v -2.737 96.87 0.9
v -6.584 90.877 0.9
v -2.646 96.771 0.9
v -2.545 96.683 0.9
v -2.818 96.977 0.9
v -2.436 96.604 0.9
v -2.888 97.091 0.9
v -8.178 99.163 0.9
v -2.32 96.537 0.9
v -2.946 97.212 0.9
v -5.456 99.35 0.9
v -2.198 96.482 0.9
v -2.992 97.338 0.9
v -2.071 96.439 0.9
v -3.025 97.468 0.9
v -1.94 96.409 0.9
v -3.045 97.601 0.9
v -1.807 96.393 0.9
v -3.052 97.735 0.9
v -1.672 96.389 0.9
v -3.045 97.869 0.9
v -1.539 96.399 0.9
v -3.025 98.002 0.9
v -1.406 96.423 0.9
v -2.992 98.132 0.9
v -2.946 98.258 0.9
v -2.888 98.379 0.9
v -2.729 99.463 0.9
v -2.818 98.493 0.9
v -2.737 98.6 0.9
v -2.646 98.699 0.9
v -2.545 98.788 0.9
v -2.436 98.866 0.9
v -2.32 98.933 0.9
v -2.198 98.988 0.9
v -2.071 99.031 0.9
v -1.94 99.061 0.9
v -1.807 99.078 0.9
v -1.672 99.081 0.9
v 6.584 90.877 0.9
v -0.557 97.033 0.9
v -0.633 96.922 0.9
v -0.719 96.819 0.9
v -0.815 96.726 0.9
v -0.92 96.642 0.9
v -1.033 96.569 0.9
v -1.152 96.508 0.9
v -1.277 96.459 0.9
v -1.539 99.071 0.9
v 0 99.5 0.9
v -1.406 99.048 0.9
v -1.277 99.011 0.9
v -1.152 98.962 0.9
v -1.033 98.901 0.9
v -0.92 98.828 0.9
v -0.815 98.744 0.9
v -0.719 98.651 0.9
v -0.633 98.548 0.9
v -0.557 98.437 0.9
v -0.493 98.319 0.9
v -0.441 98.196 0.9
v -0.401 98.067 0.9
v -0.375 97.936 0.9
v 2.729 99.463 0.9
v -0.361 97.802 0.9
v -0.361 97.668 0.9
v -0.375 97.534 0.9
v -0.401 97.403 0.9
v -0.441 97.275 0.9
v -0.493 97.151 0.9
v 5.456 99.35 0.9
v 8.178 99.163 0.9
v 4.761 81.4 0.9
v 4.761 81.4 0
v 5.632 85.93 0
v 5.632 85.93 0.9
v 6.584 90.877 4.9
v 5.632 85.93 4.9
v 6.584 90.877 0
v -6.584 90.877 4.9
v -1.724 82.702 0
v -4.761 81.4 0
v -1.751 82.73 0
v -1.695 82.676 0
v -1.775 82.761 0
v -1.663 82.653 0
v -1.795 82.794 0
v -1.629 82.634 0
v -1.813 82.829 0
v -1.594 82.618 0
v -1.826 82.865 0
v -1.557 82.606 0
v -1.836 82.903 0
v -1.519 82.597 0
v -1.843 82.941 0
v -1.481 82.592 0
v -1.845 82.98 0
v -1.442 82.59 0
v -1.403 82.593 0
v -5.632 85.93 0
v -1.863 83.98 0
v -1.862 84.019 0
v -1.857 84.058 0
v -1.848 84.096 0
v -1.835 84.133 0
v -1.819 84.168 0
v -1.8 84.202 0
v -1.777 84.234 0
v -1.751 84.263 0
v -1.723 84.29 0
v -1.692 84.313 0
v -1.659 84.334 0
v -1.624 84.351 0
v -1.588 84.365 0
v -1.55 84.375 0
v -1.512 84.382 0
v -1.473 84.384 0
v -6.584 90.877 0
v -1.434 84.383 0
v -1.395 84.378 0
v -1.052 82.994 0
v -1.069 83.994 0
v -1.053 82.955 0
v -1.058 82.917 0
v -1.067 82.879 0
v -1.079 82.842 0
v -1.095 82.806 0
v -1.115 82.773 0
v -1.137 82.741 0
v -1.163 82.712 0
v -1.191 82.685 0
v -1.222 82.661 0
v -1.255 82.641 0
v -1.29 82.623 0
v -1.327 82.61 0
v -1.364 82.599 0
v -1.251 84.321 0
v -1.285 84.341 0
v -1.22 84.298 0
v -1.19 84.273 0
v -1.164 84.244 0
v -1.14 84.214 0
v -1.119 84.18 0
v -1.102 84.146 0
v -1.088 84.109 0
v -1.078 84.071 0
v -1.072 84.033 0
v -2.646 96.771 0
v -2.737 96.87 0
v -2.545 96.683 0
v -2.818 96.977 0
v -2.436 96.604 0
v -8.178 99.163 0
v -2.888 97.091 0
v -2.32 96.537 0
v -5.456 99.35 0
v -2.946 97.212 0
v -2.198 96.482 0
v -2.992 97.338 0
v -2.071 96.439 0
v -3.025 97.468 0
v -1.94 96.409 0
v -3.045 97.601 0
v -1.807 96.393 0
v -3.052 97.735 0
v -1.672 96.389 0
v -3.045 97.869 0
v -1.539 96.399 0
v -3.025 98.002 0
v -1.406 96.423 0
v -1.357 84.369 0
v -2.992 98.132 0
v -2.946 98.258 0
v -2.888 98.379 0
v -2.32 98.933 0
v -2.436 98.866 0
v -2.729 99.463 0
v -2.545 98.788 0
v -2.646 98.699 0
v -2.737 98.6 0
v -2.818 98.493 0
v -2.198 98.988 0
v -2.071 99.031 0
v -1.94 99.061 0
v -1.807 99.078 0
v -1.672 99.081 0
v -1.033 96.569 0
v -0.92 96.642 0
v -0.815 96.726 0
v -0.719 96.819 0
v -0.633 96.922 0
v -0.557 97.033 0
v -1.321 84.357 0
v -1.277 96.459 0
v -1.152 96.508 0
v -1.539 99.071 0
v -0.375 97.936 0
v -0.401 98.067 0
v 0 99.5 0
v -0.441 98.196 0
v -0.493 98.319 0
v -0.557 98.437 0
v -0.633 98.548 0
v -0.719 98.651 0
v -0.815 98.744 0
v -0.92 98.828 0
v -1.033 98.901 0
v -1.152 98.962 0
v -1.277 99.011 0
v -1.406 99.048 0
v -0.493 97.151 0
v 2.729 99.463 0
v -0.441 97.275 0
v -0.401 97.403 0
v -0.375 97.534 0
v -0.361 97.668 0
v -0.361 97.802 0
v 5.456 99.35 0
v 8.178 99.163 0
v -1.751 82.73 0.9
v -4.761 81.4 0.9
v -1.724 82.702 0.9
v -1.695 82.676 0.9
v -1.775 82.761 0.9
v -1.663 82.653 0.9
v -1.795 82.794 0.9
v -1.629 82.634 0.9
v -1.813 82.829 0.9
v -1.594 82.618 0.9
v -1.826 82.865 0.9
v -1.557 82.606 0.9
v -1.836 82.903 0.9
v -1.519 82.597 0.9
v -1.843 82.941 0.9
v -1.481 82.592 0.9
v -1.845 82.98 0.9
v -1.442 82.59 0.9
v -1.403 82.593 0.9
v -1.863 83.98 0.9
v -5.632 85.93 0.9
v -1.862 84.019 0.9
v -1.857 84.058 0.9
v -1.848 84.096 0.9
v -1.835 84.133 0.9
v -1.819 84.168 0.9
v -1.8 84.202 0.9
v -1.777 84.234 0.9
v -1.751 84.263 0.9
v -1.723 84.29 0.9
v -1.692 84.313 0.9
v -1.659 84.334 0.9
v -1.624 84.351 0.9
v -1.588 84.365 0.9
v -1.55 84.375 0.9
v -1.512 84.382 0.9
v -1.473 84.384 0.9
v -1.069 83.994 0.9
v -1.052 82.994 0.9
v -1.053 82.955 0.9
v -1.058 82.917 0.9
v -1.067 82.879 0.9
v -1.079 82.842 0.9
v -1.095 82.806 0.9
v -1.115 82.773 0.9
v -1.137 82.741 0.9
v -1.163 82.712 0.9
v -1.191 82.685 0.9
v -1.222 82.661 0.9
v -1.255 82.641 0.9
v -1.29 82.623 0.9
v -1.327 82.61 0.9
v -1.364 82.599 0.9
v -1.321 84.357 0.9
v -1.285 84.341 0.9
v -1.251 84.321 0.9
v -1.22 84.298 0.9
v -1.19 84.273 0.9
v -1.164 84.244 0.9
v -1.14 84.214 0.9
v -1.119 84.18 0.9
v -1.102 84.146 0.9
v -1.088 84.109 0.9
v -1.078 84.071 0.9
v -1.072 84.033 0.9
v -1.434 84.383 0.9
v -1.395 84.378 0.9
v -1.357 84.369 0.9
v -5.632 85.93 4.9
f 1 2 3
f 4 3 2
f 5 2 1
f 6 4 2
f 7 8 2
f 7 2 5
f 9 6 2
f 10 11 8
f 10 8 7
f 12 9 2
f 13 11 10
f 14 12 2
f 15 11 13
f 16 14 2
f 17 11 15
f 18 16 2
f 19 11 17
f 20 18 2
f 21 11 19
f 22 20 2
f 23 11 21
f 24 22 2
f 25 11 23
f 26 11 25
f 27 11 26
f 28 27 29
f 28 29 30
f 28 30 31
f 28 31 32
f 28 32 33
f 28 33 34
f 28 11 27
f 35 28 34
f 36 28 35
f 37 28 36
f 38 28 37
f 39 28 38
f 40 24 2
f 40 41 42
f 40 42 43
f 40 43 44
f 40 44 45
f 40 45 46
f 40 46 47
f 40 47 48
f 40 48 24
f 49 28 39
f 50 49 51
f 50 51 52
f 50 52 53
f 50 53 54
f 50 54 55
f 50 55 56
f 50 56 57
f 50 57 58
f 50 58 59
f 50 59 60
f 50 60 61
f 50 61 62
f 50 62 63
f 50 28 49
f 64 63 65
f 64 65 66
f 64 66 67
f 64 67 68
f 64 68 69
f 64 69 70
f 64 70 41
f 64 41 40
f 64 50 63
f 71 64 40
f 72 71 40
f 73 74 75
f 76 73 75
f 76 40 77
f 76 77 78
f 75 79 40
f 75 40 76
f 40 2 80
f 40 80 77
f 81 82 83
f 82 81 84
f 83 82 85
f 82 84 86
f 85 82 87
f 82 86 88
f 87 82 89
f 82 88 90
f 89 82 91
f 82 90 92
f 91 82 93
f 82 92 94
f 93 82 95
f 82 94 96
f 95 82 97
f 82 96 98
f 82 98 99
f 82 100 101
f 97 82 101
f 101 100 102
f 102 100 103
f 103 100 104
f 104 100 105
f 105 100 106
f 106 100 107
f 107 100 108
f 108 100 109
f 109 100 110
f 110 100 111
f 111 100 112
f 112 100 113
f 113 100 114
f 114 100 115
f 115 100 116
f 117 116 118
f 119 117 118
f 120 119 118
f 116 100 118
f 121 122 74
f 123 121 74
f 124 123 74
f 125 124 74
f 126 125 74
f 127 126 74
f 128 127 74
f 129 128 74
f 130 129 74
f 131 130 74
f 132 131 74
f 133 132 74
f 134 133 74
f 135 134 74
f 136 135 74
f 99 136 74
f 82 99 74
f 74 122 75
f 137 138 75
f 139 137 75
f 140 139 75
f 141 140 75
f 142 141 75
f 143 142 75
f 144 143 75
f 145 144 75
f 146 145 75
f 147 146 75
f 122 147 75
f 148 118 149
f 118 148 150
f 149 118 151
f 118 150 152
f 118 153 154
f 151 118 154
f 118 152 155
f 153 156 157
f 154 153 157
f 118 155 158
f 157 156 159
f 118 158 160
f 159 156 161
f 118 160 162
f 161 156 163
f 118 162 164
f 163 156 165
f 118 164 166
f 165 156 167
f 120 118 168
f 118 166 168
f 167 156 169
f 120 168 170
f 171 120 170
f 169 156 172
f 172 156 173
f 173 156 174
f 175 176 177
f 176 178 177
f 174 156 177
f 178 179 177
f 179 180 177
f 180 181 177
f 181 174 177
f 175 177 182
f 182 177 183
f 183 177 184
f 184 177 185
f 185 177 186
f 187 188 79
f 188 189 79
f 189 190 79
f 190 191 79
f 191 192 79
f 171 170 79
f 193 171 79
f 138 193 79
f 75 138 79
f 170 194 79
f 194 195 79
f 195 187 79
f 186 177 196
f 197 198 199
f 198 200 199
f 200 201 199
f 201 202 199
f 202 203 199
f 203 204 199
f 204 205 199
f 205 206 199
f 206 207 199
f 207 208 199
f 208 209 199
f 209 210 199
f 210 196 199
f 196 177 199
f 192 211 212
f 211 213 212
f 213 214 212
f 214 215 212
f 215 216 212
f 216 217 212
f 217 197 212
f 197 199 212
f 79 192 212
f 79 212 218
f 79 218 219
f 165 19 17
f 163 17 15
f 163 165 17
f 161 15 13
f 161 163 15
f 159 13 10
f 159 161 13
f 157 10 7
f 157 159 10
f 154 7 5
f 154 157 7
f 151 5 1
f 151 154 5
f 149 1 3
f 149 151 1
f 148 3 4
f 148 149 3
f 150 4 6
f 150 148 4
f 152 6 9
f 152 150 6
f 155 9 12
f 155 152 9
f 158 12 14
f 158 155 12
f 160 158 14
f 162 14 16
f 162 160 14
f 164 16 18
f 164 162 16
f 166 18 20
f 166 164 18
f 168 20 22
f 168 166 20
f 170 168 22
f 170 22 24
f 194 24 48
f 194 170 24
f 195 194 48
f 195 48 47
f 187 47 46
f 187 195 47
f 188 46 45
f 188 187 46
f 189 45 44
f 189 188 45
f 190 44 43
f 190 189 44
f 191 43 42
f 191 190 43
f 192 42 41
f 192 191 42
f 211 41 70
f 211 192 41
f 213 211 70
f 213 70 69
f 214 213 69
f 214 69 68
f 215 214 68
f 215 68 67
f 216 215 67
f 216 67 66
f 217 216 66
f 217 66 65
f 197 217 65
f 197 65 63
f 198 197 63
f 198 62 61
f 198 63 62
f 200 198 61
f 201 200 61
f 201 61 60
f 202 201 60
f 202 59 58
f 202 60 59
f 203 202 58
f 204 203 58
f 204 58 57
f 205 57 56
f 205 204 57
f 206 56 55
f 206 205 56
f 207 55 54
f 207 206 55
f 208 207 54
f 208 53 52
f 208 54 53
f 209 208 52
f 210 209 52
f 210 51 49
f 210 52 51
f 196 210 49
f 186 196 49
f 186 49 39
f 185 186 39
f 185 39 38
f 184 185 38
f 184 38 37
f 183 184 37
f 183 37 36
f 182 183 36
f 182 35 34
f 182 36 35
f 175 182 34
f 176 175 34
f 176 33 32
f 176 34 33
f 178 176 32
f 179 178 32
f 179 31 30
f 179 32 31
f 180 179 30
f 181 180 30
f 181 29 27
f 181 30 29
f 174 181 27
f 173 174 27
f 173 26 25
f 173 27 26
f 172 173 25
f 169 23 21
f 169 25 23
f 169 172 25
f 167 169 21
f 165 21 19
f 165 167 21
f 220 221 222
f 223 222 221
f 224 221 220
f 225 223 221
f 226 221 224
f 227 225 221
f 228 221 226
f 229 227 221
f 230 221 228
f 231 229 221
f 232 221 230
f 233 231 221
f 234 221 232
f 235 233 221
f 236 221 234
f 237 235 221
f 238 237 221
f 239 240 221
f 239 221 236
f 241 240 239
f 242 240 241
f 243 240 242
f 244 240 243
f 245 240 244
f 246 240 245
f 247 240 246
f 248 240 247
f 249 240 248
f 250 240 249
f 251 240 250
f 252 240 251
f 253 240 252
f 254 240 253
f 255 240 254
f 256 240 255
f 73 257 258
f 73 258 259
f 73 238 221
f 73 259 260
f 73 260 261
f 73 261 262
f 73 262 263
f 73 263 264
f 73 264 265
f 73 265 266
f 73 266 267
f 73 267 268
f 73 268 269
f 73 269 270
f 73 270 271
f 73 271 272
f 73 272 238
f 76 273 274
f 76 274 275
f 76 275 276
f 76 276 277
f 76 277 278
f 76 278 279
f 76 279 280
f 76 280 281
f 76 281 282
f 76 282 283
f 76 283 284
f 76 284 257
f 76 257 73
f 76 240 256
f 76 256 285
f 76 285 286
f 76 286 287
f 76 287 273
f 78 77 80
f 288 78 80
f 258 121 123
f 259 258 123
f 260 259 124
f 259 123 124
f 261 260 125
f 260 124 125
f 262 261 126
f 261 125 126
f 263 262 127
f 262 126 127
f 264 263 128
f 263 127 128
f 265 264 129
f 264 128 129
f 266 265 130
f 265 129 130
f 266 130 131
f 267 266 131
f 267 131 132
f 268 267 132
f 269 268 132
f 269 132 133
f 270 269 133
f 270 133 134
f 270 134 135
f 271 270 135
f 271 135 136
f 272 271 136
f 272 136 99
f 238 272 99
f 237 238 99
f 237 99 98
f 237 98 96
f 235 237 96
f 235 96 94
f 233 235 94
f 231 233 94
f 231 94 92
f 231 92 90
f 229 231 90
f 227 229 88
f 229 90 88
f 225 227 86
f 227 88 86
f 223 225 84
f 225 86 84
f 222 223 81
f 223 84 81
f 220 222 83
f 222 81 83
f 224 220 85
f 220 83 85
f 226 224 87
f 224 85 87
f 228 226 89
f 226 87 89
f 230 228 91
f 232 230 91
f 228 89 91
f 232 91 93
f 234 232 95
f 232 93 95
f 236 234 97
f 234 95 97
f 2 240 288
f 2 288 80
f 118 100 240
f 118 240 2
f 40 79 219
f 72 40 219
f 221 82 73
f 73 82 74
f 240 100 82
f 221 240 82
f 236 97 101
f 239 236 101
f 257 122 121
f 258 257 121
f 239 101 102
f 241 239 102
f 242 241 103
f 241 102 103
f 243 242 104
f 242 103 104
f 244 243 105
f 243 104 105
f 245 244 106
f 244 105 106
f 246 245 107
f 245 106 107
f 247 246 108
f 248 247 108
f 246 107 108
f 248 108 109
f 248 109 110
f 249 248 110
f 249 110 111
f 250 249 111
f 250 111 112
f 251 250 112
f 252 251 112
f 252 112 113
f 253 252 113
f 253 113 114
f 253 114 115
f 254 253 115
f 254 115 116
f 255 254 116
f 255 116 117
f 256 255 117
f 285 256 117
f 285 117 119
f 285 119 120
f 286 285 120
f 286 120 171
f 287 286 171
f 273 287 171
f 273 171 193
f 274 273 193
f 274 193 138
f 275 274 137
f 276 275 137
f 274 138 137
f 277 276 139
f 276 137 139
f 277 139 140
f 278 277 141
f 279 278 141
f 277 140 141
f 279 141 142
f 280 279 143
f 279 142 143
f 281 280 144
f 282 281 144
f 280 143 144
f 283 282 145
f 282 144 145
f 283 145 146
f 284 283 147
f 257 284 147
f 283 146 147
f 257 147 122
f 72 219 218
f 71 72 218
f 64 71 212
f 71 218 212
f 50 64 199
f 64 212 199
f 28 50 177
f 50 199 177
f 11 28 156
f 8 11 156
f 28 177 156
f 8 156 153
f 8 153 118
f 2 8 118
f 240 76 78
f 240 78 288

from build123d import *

# Parameters (mm, degrees)
EXTRUDE1_DEPTH     = 4.9
EXTRUDE2_DEPTH     = 0.9
SKETCH3_R          = 1.3462
CUT_EXTRUDE2_DEPTH = 5.9


with BuildPart() as part:
    # Sketch1 → Extrude1 (new body)
    with BuildSketch(Plane.XY):
        Polygon((-6.583958388, 90.87662316), (6.583958388, 90.87662316), (5.632133126, 85.929746212), (-5.632133126, 85.929746212), align=None)
    extrude(amount=EXTRUDE1_DEPTH)

    # Sketch2 → Extrude2 (add)
    with BuildSketch(Plane(origin=(0, 0, 0), x_dir=(-1, 0, 0), z_dir=(0, 0, -1))):
        with BuildLine():
            Line((8.178395959, 99.163319022), (6.538639227, 90.641088001))
            ThreePointArc((6.538639227, 90.641088001), (0, 90.87662316), (-6.538639227, 90.641088001))
            Line((-6.538639227, 90.641088001), (-8.178395959, 99.163319022))
            ThreePointArc((-8.178395959, 99.163319022), (0, 99.5), (8.178395959, 99.163319022))
        make_face()
        with BuildLine():
            Line((5.632133126, 85.929746212), (4.760567707, 81.4))
            Line((4.760567707, 81.4), (-4.760567707, 81.4))
            Line((-4.760567707, 81.4), (-5.632133126, 85.929746212))
            ThreePointArc((-5.632133126, 85.929746212), (0, 86.11412316), (5.632133126, 85.929746212))
        make_face()
    extrude(amount=-EXTRUDE2_DEPTH)

    # Sketch3 → Cut-Extrude2 (cut, through all)
    with BuildSketch(Plane.XY):
        with Locations(Location((-1.705972729, 97.735112202, 0), (0, 0, 180))):  # turned: the seam where the file's is
            Circle(SKETCH3_R)
        with BuildLine():
            Line((-1.069188916, 83.994208969), (-1.051733851, 82.994208969))
            ThreePointArc((-1.051733851, 82.994208969), (-1.441621981, 82.590467992), (-1.845362959, 82.980356122))
            Line((-1.845362959, 82.980356122), (-1.862818024, 83.980356122))
            ThreePointArc((-1.862818024, 83.980356122), (-1.472929894, 84.3840971), (-1.069188916, 83.994208969))
        make_face()
    extrude(amount=CUT_EXTRUDE2_DEPTH, mode=Mode.SUBTRACT)


solid = part.part
